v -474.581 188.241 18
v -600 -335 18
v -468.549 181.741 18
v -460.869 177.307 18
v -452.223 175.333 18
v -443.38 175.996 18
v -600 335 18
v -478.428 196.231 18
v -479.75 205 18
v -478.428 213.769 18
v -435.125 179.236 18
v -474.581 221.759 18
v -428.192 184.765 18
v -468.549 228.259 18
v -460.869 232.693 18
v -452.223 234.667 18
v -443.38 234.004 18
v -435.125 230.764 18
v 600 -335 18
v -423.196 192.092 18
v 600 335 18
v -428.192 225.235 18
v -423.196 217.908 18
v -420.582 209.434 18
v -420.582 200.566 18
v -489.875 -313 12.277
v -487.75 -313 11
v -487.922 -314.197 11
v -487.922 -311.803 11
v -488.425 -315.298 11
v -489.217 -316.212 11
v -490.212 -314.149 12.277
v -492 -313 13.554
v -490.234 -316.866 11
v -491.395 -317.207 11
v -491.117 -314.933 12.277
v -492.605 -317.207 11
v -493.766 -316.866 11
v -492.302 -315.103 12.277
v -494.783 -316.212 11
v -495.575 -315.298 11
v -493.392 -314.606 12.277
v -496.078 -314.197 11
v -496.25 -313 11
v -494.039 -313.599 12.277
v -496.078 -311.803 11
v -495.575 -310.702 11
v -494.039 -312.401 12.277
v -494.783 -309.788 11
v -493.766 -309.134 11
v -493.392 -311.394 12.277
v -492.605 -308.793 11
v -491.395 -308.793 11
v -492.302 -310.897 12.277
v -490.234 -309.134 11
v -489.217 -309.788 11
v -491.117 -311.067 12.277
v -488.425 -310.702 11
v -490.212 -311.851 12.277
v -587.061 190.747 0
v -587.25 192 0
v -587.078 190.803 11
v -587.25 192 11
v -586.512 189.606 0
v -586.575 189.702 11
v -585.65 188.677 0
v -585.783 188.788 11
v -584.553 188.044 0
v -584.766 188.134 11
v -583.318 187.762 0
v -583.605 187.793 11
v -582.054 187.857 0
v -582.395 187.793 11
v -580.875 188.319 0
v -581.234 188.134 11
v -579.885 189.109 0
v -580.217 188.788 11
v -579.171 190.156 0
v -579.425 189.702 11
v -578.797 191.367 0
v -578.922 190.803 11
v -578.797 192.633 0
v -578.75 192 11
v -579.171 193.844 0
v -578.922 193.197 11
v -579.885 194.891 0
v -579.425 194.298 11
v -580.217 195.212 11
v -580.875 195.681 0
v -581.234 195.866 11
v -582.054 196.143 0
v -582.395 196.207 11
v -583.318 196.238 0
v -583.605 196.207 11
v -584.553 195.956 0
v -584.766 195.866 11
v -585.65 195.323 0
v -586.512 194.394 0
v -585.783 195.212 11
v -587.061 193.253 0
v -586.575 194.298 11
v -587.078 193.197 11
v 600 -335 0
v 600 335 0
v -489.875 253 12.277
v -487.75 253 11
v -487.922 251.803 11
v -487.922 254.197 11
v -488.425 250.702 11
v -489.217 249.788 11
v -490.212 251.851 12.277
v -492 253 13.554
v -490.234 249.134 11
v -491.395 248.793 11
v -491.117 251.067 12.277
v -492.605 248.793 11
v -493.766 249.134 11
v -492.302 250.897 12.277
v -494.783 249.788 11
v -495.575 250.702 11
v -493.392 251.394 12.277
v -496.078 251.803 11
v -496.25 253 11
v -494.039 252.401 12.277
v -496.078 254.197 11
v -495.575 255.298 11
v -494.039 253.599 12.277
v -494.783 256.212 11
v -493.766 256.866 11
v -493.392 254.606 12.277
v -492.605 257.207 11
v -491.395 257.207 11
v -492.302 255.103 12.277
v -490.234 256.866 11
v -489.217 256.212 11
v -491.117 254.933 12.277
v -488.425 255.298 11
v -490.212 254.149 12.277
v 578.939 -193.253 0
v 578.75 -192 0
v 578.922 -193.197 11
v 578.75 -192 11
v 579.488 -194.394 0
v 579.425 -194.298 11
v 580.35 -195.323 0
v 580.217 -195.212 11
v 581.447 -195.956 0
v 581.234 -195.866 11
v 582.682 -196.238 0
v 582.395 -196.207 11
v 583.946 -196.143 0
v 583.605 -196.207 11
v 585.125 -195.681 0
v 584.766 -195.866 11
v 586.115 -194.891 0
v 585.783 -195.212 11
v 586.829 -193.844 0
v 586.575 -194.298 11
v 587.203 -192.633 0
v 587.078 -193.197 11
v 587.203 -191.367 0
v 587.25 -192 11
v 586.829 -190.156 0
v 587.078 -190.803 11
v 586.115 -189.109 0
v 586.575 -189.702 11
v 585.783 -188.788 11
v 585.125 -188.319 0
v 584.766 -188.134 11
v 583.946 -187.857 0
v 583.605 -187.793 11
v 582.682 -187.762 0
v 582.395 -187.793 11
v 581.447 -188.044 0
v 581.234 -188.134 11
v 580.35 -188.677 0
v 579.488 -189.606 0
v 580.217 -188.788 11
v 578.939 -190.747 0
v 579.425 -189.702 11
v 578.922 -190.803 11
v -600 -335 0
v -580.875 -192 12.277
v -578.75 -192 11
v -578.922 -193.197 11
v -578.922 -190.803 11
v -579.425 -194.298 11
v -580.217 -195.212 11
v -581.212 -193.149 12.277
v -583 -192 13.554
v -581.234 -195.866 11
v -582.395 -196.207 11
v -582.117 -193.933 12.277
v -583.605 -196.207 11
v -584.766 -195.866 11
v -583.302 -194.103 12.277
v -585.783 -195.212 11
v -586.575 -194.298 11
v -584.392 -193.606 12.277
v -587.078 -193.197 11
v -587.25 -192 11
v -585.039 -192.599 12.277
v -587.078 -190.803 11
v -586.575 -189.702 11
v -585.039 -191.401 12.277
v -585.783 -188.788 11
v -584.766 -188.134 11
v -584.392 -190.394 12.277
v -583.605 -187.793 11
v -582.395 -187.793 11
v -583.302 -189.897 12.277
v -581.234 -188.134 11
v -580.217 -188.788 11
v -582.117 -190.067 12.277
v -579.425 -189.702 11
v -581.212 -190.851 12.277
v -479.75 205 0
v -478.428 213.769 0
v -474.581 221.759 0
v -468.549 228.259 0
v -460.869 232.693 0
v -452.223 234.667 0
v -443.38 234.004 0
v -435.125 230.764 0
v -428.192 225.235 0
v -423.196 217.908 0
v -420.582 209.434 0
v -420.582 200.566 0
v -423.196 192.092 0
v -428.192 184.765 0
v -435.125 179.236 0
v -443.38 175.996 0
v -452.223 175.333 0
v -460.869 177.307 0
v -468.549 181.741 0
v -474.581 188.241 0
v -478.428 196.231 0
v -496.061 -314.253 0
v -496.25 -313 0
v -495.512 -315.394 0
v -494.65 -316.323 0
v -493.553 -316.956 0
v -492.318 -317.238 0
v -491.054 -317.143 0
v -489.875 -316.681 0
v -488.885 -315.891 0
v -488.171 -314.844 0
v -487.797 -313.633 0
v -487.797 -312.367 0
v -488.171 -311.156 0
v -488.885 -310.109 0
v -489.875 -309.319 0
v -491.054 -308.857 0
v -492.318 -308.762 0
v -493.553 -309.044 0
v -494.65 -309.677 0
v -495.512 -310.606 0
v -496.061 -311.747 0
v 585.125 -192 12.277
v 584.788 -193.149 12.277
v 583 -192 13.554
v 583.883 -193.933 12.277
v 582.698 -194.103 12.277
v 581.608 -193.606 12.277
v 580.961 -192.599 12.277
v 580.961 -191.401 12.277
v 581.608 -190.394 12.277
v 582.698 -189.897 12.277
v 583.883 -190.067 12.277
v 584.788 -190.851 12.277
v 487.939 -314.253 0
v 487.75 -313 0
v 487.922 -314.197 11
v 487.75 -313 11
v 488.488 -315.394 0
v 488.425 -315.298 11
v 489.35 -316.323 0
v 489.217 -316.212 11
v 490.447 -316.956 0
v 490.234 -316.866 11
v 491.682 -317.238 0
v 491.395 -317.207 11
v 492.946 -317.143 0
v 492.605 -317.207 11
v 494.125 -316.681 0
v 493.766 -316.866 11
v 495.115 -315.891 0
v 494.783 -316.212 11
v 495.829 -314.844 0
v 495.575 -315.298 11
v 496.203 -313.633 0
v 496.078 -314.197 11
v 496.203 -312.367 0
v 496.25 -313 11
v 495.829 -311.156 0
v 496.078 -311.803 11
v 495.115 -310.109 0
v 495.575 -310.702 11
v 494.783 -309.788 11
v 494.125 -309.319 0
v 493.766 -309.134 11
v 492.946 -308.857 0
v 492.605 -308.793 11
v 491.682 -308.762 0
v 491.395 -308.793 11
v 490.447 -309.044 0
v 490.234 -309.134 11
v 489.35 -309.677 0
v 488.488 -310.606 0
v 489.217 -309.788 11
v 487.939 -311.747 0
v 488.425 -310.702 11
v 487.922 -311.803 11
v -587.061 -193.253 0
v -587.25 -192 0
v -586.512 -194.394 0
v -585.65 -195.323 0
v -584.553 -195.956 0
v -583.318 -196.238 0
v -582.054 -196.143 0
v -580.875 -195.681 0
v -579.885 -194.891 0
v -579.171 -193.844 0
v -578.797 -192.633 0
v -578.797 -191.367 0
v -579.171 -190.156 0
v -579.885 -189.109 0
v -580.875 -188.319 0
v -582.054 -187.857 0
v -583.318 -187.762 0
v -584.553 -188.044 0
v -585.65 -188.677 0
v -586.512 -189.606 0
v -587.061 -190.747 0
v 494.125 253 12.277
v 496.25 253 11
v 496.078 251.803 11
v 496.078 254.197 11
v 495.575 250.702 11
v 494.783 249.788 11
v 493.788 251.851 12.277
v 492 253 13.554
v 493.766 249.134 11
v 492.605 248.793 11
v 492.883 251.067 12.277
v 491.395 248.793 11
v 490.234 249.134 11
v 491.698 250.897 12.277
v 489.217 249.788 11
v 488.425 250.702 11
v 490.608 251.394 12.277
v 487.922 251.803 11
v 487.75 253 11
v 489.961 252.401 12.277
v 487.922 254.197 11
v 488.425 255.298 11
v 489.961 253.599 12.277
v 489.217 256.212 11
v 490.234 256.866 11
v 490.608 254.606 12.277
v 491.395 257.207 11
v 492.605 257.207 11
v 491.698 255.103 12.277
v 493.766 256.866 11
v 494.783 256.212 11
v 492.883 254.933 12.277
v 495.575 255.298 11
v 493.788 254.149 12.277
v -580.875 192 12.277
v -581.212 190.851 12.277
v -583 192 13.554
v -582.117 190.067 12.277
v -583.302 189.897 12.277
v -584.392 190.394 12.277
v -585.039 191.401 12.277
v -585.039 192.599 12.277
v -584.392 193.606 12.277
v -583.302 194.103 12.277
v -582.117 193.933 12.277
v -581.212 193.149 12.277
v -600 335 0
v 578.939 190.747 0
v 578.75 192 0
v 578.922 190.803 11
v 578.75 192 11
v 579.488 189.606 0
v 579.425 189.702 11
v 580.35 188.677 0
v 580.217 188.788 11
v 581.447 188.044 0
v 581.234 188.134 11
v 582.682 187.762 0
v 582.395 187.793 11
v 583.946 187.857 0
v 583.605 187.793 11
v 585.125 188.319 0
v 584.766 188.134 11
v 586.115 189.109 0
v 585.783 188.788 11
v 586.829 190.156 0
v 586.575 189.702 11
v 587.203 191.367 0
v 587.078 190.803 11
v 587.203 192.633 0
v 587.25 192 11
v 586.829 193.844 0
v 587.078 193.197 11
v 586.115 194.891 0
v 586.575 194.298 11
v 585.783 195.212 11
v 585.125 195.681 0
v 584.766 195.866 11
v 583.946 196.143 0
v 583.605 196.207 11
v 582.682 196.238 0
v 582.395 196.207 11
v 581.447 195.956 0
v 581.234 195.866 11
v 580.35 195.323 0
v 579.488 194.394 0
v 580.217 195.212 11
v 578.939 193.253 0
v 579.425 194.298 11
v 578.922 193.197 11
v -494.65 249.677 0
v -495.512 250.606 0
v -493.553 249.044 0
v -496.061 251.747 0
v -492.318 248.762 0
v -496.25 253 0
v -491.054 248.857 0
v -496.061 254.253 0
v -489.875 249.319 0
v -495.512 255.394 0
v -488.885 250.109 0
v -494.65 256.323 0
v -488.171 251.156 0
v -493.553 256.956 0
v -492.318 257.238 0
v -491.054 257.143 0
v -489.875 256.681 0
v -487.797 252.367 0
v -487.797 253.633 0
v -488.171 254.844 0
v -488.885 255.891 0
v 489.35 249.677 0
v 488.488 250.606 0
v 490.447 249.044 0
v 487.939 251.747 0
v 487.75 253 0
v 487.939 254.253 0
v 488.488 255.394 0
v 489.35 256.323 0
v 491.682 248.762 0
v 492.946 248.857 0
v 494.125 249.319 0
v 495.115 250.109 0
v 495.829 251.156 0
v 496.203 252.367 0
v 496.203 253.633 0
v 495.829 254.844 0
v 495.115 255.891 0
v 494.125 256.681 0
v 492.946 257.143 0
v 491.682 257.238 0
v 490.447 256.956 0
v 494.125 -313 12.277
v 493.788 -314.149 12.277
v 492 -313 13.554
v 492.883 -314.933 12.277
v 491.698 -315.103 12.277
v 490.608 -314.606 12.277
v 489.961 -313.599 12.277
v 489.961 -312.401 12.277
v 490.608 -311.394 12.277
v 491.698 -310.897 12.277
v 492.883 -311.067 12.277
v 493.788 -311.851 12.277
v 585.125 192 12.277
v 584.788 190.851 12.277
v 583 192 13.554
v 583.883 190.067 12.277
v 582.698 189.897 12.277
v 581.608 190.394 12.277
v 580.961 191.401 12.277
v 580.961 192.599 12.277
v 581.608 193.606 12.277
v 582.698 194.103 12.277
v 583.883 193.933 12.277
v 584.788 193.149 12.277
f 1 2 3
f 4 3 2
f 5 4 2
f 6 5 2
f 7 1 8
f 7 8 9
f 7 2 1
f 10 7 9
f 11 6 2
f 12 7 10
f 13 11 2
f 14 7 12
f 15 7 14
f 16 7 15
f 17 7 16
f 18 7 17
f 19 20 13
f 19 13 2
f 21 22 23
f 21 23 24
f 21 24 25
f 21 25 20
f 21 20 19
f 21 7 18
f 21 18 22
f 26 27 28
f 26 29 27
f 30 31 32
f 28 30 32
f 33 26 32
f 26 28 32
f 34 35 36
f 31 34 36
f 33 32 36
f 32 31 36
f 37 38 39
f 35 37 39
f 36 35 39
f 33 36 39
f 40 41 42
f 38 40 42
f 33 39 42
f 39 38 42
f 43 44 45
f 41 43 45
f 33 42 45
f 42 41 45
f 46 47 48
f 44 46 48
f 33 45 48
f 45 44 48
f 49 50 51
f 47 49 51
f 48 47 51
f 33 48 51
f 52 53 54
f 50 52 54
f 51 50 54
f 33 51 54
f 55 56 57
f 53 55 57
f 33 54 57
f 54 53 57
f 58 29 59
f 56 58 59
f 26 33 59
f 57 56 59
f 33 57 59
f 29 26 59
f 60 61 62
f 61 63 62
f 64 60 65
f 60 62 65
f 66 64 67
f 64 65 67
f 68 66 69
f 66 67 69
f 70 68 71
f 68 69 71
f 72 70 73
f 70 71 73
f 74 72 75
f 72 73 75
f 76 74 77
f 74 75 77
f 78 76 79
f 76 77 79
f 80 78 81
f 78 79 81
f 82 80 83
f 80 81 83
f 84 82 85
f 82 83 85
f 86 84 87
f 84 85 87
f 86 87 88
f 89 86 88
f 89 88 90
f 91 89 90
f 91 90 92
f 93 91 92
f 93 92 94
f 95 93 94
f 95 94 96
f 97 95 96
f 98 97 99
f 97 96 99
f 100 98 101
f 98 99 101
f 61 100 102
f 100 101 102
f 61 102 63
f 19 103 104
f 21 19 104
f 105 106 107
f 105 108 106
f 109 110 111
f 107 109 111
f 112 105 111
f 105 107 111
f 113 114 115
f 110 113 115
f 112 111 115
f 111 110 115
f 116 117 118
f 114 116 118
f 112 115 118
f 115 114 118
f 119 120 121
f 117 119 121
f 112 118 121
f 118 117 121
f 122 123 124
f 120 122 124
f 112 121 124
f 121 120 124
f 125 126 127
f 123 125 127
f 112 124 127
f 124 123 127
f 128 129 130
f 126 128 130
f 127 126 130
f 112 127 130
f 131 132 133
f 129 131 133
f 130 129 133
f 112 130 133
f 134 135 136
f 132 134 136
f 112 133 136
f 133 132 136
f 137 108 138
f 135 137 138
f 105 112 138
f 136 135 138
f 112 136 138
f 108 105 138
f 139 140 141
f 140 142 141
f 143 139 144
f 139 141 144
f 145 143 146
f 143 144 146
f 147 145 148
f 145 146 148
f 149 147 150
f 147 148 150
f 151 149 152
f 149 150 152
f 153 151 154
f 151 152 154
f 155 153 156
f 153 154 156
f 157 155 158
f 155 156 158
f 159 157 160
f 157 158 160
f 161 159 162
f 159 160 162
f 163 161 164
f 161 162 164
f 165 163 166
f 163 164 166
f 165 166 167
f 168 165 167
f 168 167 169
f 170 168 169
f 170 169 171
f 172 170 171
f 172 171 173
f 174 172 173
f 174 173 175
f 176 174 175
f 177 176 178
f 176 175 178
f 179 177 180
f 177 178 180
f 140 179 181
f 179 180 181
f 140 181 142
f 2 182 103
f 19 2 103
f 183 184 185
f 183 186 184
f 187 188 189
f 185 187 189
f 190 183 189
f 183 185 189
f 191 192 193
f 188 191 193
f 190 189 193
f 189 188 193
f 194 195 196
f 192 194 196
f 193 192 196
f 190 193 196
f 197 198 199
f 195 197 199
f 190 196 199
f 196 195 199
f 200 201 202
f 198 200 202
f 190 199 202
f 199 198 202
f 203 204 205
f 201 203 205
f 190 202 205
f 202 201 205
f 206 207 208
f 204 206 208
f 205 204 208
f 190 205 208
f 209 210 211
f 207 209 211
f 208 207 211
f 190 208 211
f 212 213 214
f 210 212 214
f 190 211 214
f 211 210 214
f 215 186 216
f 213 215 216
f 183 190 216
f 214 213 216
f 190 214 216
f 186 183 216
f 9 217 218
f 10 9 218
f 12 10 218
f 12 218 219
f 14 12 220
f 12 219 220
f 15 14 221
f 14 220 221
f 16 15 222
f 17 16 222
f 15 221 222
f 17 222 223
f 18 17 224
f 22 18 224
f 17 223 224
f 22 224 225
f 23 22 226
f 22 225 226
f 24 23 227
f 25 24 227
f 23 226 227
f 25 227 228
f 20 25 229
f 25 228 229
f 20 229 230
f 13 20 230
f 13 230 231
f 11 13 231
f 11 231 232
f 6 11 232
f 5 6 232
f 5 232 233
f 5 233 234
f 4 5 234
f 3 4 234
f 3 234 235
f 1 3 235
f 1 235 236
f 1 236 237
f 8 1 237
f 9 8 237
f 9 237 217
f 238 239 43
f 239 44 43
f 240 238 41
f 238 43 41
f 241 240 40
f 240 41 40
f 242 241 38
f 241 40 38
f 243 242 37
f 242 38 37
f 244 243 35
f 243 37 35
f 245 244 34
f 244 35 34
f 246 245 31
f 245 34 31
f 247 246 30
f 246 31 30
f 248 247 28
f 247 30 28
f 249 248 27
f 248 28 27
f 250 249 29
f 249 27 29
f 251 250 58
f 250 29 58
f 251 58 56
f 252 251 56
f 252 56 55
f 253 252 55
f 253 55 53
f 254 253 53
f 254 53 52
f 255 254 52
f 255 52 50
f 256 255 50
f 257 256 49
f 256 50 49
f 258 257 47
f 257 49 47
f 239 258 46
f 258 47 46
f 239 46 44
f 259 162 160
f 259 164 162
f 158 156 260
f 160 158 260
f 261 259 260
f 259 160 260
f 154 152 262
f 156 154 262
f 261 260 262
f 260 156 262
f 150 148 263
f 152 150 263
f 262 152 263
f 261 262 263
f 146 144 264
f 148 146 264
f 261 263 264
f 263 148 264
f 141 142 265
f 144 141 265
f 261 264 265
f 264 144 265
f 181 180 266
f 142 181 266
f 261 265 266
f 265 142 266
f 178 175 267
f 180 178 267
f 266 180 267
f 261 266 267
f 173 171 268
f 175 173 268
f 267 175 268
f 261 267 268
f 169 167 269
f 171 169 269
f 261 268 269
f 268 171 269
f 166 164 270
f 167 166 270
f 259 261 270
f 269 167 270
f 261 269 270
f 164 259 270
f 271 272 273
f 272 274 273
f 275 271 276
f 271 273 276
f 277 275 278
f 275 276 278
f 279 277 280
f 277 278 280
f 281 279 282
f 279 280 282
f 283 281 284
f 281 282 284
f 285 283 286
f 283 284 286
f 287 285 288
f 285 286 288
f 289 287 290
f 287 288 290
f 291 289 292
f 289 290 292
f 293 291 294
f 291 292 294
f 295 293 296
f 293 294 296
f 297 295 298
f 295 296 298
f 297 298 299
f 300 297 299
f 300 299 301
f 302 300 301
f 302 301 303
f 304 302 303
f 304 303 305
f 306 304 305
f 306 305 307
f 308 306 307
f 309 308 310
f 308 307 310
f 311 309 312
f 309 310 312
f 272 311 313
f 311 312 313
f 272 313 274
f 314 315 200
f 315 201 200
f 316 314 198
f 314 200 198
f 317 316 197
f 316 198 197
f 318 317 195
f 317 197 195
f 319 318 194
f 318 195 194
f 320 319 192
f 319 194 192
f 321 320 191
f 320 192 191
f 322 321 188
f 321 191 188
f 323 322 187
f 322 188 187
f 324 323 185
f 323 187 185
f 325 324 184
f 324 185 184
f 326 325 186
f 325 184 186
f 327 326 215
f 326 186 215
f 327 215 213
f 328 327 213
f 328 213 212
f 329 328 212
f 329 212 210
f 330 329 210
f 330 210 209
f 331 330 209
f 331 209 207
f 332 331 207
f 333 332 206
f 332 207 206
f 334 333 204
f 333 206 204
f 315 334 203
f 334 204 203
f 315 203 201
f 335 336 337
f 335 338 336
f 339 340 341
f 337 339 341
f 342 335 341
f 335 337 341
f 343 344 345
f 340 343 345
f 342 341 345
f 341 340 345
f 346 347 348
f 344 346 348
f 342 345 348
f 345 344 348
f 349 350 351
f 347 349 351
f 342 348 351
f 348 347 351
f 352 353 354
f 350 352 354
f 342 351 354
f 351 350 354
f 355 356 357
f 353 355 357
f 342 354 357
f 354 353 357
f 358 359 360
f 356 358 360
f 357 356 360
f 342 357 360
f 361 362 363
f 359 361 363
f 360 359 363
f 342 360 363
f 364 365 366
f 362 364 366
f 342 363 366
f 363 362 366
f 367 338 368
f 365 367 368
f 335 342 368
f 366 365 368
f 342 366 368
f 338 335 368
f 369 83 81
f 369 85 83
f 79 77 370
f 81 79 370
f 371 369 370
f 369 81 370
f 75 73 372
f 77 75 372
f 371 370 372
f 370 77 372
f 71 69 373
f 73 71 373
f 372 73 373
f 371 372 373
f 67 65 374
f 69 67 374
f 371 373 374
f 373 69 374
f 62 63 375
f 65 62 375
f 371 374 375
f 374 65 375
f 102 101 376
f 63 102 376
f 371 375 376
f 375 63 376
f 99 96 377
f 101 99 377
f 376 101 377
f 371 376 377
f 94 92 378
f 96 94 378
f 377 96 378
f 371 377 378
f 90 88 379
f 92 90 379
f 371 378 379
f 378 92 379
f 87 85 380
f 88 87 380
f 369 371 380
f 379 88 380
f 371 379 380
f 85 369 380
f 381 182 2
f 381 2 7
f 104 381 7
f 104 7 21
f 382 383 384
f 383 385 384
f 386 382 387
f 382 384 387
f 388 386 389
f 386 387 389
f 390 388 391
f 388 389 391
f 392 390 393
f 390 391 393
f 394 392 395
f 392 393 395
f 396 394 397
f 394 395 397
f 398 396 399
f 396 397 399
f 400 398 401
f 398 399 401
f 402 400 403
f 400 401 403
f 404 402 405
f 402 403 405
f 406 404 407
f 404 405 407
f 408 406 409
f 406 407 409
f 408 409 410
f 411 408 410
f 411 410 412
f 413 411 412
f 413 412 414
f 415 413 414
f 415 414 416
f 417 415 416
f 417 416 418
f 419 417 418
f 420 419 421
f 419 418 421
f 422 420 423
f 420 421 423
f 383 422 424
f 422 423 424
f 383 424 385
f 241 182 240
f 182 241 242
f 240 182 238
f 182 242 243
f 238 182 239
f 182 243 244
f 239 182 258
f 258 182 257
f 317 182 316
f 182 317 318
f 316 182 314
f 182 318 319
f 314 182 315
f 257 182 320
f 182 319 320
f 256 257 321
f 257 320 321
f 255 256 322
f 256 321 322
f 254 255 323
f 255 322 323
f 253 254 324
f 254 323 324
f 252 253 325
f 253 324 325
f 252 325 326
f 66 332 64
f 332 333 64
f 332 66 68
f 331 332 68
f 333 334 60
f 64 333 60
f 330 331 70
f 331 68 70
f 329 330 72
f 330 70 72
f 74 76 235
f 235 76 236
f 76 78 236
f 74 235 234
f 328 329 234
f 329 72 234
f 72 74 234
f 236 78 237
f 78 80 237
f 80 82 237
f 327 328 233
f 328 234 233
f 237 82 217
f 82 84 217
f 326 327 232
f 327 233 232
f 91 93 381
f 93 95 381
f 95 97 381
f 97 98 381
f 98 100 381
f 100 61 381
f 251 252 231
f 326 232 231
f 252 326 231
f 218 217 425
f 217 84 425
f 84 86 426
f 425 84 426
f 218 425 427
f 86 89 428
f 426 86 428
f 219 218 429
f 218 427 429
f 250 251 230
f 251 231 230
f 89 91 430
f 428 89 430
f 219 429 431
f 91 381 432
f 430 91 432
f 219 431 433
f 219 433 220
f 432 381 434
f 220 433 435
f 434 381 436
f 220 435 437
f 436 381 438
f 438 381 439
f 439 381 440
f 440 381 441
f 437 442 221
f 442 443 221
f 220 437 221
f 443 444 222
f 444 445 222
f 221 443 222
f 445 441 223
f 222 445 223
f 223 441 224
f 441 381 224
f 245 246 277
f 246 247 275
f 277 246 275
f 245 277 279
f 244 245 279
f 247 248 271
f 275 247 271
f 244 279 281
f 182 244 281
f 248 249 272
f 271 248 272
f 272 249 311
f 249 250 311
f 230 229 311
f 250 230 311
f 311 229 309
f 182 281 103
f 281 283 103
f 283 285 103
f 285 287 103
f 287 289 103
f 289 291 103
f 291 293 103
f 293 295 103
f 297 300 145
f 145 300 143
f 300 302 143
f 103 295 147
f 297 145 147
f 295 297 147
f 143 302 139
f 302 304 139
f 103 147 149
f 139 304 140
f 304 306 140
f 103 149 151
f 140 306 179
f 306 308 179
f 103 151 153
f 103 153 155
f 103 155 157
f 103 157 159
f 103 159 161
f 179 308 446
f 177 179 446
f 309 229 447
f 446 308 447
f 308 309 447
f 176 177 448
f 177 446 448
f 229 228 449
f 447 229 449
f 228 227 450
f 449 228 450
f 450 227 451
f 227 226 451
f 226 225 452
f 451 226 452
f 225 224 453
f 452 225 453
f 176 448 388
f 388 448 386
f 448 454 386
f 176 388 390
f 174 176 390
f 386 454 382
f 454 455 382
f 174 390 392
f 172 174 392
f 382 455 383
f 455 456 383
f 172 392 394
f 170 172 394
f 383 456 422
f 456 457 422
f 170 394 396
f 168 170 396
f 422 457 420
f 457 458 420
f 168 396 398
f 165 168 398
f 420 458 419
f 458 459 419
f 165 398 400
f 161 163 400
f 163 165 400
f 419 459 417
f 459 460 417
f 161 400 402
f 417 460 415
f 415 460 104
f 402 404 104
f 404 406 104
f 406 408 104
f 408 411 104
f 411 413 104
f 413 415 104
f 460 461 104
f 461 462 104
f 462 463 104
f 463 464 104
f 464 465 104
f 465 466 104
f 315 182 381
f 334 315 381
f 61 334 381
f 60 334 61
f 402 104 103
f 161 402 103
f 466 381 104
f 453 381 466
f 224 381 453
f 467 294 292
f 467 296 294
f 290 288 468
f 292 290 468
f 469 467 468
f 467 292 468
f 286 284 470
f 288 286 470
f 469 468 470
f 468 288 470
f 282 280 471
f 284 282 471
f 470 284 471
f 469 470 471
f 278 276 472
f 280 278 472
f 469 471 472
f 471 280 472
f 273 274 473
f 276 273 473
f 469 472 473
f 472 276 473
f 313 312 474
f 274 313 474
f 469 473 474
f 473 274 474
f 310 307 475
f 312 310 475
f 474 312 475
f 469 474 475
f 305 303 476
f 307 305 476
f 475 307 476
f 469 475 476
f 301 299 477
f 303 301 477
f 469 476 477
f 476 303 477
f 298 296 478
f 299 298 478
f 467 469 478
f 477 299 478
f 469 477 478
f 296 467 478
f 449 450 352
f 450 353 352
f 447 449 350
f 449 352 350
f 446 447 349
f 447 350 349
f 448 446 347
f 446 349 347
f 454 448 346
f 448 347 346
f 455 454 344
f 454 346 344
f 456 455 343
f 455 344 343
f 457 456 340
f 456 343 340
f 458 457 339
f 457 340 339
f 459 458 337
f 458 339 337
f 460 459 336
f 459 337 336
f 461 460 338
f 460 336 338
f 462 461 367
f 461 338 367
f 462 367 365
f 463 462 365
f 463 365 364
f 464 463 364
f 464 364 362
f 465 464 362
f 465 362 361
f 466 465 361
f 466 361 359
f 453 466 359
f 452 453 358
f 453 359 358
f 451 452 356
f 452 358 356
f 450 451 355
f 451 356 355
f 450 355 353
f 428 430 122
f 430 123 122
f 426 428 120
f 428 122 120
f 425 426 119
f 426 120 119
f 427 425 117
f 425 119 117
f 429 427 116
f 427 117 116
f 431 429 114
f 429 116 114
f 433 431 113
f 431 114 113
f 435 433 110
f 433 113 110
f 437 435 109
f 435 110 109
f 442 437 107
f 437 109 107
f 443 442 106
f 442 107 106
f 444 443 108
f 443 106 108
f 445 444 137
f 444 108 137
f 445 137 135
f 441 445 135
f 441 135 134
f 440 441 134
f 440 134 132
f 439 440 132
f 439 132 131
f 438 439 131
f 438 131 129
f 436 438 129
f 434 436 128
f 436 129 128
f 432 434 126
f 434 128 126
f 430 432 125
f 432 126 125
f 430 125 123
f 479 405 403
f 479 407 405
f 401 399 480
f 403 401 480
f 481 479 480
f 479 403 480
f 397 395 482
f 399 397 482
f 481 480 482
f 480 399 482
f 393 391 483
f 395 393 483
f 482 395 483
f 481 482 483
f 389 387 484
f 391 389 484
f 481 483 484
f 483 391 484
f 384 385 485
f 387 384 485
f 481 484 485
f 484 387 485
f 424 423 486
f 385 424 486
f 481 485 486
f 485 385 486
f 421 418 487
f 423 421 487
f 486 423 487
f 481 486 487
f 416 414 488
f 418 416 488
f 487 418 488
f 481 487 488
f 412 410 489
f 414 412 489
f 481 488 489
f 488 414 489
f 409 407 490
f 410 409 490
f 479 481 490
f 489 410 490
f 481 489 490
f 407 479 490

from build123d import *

# Parameters (mm, degrees)
F0_W     = 1200
F0_H     = 670
F1_DEPTH = 18
F3_D     = 59.5
F5_D     = 8.5
F5_DEPTH = 11
F5_TIP   = 2.5536576309


with BuildPart() as f1:
    # F0 (on Top) → F1 (new body)
    with BuildSketch(Plane.XY):
        Rectangle(F0_W, F0_H)
    extrude(amount=F1_DEPTH)

    # F3 (through all)
    with Locations(Plane.XY.offset(18)):
        with Locations((-450, 205)):
            Hole(F3_D / 2)

    # F5
    with Locations(Plane(origin=(0, 0, 0), x_dir=(1, 0, 0), z_dir=(0, 0, -1))):
        with Locations((-492, -253), (-583, -192), (-583, 192), (583, 192), (492, 313), (583, -192), (492, -253), (-492, 313)):
            Hole(F5_D / 2, depth=F5_DEPTH)
            with Locations((0, 0, -(F5_DEPTH + F5_TIP / 2))):  # 118° drill point
                Cone(0, F5_D / 2, F5_TIP, mode=Mode.SUBTRACT)


solid = f1.part
